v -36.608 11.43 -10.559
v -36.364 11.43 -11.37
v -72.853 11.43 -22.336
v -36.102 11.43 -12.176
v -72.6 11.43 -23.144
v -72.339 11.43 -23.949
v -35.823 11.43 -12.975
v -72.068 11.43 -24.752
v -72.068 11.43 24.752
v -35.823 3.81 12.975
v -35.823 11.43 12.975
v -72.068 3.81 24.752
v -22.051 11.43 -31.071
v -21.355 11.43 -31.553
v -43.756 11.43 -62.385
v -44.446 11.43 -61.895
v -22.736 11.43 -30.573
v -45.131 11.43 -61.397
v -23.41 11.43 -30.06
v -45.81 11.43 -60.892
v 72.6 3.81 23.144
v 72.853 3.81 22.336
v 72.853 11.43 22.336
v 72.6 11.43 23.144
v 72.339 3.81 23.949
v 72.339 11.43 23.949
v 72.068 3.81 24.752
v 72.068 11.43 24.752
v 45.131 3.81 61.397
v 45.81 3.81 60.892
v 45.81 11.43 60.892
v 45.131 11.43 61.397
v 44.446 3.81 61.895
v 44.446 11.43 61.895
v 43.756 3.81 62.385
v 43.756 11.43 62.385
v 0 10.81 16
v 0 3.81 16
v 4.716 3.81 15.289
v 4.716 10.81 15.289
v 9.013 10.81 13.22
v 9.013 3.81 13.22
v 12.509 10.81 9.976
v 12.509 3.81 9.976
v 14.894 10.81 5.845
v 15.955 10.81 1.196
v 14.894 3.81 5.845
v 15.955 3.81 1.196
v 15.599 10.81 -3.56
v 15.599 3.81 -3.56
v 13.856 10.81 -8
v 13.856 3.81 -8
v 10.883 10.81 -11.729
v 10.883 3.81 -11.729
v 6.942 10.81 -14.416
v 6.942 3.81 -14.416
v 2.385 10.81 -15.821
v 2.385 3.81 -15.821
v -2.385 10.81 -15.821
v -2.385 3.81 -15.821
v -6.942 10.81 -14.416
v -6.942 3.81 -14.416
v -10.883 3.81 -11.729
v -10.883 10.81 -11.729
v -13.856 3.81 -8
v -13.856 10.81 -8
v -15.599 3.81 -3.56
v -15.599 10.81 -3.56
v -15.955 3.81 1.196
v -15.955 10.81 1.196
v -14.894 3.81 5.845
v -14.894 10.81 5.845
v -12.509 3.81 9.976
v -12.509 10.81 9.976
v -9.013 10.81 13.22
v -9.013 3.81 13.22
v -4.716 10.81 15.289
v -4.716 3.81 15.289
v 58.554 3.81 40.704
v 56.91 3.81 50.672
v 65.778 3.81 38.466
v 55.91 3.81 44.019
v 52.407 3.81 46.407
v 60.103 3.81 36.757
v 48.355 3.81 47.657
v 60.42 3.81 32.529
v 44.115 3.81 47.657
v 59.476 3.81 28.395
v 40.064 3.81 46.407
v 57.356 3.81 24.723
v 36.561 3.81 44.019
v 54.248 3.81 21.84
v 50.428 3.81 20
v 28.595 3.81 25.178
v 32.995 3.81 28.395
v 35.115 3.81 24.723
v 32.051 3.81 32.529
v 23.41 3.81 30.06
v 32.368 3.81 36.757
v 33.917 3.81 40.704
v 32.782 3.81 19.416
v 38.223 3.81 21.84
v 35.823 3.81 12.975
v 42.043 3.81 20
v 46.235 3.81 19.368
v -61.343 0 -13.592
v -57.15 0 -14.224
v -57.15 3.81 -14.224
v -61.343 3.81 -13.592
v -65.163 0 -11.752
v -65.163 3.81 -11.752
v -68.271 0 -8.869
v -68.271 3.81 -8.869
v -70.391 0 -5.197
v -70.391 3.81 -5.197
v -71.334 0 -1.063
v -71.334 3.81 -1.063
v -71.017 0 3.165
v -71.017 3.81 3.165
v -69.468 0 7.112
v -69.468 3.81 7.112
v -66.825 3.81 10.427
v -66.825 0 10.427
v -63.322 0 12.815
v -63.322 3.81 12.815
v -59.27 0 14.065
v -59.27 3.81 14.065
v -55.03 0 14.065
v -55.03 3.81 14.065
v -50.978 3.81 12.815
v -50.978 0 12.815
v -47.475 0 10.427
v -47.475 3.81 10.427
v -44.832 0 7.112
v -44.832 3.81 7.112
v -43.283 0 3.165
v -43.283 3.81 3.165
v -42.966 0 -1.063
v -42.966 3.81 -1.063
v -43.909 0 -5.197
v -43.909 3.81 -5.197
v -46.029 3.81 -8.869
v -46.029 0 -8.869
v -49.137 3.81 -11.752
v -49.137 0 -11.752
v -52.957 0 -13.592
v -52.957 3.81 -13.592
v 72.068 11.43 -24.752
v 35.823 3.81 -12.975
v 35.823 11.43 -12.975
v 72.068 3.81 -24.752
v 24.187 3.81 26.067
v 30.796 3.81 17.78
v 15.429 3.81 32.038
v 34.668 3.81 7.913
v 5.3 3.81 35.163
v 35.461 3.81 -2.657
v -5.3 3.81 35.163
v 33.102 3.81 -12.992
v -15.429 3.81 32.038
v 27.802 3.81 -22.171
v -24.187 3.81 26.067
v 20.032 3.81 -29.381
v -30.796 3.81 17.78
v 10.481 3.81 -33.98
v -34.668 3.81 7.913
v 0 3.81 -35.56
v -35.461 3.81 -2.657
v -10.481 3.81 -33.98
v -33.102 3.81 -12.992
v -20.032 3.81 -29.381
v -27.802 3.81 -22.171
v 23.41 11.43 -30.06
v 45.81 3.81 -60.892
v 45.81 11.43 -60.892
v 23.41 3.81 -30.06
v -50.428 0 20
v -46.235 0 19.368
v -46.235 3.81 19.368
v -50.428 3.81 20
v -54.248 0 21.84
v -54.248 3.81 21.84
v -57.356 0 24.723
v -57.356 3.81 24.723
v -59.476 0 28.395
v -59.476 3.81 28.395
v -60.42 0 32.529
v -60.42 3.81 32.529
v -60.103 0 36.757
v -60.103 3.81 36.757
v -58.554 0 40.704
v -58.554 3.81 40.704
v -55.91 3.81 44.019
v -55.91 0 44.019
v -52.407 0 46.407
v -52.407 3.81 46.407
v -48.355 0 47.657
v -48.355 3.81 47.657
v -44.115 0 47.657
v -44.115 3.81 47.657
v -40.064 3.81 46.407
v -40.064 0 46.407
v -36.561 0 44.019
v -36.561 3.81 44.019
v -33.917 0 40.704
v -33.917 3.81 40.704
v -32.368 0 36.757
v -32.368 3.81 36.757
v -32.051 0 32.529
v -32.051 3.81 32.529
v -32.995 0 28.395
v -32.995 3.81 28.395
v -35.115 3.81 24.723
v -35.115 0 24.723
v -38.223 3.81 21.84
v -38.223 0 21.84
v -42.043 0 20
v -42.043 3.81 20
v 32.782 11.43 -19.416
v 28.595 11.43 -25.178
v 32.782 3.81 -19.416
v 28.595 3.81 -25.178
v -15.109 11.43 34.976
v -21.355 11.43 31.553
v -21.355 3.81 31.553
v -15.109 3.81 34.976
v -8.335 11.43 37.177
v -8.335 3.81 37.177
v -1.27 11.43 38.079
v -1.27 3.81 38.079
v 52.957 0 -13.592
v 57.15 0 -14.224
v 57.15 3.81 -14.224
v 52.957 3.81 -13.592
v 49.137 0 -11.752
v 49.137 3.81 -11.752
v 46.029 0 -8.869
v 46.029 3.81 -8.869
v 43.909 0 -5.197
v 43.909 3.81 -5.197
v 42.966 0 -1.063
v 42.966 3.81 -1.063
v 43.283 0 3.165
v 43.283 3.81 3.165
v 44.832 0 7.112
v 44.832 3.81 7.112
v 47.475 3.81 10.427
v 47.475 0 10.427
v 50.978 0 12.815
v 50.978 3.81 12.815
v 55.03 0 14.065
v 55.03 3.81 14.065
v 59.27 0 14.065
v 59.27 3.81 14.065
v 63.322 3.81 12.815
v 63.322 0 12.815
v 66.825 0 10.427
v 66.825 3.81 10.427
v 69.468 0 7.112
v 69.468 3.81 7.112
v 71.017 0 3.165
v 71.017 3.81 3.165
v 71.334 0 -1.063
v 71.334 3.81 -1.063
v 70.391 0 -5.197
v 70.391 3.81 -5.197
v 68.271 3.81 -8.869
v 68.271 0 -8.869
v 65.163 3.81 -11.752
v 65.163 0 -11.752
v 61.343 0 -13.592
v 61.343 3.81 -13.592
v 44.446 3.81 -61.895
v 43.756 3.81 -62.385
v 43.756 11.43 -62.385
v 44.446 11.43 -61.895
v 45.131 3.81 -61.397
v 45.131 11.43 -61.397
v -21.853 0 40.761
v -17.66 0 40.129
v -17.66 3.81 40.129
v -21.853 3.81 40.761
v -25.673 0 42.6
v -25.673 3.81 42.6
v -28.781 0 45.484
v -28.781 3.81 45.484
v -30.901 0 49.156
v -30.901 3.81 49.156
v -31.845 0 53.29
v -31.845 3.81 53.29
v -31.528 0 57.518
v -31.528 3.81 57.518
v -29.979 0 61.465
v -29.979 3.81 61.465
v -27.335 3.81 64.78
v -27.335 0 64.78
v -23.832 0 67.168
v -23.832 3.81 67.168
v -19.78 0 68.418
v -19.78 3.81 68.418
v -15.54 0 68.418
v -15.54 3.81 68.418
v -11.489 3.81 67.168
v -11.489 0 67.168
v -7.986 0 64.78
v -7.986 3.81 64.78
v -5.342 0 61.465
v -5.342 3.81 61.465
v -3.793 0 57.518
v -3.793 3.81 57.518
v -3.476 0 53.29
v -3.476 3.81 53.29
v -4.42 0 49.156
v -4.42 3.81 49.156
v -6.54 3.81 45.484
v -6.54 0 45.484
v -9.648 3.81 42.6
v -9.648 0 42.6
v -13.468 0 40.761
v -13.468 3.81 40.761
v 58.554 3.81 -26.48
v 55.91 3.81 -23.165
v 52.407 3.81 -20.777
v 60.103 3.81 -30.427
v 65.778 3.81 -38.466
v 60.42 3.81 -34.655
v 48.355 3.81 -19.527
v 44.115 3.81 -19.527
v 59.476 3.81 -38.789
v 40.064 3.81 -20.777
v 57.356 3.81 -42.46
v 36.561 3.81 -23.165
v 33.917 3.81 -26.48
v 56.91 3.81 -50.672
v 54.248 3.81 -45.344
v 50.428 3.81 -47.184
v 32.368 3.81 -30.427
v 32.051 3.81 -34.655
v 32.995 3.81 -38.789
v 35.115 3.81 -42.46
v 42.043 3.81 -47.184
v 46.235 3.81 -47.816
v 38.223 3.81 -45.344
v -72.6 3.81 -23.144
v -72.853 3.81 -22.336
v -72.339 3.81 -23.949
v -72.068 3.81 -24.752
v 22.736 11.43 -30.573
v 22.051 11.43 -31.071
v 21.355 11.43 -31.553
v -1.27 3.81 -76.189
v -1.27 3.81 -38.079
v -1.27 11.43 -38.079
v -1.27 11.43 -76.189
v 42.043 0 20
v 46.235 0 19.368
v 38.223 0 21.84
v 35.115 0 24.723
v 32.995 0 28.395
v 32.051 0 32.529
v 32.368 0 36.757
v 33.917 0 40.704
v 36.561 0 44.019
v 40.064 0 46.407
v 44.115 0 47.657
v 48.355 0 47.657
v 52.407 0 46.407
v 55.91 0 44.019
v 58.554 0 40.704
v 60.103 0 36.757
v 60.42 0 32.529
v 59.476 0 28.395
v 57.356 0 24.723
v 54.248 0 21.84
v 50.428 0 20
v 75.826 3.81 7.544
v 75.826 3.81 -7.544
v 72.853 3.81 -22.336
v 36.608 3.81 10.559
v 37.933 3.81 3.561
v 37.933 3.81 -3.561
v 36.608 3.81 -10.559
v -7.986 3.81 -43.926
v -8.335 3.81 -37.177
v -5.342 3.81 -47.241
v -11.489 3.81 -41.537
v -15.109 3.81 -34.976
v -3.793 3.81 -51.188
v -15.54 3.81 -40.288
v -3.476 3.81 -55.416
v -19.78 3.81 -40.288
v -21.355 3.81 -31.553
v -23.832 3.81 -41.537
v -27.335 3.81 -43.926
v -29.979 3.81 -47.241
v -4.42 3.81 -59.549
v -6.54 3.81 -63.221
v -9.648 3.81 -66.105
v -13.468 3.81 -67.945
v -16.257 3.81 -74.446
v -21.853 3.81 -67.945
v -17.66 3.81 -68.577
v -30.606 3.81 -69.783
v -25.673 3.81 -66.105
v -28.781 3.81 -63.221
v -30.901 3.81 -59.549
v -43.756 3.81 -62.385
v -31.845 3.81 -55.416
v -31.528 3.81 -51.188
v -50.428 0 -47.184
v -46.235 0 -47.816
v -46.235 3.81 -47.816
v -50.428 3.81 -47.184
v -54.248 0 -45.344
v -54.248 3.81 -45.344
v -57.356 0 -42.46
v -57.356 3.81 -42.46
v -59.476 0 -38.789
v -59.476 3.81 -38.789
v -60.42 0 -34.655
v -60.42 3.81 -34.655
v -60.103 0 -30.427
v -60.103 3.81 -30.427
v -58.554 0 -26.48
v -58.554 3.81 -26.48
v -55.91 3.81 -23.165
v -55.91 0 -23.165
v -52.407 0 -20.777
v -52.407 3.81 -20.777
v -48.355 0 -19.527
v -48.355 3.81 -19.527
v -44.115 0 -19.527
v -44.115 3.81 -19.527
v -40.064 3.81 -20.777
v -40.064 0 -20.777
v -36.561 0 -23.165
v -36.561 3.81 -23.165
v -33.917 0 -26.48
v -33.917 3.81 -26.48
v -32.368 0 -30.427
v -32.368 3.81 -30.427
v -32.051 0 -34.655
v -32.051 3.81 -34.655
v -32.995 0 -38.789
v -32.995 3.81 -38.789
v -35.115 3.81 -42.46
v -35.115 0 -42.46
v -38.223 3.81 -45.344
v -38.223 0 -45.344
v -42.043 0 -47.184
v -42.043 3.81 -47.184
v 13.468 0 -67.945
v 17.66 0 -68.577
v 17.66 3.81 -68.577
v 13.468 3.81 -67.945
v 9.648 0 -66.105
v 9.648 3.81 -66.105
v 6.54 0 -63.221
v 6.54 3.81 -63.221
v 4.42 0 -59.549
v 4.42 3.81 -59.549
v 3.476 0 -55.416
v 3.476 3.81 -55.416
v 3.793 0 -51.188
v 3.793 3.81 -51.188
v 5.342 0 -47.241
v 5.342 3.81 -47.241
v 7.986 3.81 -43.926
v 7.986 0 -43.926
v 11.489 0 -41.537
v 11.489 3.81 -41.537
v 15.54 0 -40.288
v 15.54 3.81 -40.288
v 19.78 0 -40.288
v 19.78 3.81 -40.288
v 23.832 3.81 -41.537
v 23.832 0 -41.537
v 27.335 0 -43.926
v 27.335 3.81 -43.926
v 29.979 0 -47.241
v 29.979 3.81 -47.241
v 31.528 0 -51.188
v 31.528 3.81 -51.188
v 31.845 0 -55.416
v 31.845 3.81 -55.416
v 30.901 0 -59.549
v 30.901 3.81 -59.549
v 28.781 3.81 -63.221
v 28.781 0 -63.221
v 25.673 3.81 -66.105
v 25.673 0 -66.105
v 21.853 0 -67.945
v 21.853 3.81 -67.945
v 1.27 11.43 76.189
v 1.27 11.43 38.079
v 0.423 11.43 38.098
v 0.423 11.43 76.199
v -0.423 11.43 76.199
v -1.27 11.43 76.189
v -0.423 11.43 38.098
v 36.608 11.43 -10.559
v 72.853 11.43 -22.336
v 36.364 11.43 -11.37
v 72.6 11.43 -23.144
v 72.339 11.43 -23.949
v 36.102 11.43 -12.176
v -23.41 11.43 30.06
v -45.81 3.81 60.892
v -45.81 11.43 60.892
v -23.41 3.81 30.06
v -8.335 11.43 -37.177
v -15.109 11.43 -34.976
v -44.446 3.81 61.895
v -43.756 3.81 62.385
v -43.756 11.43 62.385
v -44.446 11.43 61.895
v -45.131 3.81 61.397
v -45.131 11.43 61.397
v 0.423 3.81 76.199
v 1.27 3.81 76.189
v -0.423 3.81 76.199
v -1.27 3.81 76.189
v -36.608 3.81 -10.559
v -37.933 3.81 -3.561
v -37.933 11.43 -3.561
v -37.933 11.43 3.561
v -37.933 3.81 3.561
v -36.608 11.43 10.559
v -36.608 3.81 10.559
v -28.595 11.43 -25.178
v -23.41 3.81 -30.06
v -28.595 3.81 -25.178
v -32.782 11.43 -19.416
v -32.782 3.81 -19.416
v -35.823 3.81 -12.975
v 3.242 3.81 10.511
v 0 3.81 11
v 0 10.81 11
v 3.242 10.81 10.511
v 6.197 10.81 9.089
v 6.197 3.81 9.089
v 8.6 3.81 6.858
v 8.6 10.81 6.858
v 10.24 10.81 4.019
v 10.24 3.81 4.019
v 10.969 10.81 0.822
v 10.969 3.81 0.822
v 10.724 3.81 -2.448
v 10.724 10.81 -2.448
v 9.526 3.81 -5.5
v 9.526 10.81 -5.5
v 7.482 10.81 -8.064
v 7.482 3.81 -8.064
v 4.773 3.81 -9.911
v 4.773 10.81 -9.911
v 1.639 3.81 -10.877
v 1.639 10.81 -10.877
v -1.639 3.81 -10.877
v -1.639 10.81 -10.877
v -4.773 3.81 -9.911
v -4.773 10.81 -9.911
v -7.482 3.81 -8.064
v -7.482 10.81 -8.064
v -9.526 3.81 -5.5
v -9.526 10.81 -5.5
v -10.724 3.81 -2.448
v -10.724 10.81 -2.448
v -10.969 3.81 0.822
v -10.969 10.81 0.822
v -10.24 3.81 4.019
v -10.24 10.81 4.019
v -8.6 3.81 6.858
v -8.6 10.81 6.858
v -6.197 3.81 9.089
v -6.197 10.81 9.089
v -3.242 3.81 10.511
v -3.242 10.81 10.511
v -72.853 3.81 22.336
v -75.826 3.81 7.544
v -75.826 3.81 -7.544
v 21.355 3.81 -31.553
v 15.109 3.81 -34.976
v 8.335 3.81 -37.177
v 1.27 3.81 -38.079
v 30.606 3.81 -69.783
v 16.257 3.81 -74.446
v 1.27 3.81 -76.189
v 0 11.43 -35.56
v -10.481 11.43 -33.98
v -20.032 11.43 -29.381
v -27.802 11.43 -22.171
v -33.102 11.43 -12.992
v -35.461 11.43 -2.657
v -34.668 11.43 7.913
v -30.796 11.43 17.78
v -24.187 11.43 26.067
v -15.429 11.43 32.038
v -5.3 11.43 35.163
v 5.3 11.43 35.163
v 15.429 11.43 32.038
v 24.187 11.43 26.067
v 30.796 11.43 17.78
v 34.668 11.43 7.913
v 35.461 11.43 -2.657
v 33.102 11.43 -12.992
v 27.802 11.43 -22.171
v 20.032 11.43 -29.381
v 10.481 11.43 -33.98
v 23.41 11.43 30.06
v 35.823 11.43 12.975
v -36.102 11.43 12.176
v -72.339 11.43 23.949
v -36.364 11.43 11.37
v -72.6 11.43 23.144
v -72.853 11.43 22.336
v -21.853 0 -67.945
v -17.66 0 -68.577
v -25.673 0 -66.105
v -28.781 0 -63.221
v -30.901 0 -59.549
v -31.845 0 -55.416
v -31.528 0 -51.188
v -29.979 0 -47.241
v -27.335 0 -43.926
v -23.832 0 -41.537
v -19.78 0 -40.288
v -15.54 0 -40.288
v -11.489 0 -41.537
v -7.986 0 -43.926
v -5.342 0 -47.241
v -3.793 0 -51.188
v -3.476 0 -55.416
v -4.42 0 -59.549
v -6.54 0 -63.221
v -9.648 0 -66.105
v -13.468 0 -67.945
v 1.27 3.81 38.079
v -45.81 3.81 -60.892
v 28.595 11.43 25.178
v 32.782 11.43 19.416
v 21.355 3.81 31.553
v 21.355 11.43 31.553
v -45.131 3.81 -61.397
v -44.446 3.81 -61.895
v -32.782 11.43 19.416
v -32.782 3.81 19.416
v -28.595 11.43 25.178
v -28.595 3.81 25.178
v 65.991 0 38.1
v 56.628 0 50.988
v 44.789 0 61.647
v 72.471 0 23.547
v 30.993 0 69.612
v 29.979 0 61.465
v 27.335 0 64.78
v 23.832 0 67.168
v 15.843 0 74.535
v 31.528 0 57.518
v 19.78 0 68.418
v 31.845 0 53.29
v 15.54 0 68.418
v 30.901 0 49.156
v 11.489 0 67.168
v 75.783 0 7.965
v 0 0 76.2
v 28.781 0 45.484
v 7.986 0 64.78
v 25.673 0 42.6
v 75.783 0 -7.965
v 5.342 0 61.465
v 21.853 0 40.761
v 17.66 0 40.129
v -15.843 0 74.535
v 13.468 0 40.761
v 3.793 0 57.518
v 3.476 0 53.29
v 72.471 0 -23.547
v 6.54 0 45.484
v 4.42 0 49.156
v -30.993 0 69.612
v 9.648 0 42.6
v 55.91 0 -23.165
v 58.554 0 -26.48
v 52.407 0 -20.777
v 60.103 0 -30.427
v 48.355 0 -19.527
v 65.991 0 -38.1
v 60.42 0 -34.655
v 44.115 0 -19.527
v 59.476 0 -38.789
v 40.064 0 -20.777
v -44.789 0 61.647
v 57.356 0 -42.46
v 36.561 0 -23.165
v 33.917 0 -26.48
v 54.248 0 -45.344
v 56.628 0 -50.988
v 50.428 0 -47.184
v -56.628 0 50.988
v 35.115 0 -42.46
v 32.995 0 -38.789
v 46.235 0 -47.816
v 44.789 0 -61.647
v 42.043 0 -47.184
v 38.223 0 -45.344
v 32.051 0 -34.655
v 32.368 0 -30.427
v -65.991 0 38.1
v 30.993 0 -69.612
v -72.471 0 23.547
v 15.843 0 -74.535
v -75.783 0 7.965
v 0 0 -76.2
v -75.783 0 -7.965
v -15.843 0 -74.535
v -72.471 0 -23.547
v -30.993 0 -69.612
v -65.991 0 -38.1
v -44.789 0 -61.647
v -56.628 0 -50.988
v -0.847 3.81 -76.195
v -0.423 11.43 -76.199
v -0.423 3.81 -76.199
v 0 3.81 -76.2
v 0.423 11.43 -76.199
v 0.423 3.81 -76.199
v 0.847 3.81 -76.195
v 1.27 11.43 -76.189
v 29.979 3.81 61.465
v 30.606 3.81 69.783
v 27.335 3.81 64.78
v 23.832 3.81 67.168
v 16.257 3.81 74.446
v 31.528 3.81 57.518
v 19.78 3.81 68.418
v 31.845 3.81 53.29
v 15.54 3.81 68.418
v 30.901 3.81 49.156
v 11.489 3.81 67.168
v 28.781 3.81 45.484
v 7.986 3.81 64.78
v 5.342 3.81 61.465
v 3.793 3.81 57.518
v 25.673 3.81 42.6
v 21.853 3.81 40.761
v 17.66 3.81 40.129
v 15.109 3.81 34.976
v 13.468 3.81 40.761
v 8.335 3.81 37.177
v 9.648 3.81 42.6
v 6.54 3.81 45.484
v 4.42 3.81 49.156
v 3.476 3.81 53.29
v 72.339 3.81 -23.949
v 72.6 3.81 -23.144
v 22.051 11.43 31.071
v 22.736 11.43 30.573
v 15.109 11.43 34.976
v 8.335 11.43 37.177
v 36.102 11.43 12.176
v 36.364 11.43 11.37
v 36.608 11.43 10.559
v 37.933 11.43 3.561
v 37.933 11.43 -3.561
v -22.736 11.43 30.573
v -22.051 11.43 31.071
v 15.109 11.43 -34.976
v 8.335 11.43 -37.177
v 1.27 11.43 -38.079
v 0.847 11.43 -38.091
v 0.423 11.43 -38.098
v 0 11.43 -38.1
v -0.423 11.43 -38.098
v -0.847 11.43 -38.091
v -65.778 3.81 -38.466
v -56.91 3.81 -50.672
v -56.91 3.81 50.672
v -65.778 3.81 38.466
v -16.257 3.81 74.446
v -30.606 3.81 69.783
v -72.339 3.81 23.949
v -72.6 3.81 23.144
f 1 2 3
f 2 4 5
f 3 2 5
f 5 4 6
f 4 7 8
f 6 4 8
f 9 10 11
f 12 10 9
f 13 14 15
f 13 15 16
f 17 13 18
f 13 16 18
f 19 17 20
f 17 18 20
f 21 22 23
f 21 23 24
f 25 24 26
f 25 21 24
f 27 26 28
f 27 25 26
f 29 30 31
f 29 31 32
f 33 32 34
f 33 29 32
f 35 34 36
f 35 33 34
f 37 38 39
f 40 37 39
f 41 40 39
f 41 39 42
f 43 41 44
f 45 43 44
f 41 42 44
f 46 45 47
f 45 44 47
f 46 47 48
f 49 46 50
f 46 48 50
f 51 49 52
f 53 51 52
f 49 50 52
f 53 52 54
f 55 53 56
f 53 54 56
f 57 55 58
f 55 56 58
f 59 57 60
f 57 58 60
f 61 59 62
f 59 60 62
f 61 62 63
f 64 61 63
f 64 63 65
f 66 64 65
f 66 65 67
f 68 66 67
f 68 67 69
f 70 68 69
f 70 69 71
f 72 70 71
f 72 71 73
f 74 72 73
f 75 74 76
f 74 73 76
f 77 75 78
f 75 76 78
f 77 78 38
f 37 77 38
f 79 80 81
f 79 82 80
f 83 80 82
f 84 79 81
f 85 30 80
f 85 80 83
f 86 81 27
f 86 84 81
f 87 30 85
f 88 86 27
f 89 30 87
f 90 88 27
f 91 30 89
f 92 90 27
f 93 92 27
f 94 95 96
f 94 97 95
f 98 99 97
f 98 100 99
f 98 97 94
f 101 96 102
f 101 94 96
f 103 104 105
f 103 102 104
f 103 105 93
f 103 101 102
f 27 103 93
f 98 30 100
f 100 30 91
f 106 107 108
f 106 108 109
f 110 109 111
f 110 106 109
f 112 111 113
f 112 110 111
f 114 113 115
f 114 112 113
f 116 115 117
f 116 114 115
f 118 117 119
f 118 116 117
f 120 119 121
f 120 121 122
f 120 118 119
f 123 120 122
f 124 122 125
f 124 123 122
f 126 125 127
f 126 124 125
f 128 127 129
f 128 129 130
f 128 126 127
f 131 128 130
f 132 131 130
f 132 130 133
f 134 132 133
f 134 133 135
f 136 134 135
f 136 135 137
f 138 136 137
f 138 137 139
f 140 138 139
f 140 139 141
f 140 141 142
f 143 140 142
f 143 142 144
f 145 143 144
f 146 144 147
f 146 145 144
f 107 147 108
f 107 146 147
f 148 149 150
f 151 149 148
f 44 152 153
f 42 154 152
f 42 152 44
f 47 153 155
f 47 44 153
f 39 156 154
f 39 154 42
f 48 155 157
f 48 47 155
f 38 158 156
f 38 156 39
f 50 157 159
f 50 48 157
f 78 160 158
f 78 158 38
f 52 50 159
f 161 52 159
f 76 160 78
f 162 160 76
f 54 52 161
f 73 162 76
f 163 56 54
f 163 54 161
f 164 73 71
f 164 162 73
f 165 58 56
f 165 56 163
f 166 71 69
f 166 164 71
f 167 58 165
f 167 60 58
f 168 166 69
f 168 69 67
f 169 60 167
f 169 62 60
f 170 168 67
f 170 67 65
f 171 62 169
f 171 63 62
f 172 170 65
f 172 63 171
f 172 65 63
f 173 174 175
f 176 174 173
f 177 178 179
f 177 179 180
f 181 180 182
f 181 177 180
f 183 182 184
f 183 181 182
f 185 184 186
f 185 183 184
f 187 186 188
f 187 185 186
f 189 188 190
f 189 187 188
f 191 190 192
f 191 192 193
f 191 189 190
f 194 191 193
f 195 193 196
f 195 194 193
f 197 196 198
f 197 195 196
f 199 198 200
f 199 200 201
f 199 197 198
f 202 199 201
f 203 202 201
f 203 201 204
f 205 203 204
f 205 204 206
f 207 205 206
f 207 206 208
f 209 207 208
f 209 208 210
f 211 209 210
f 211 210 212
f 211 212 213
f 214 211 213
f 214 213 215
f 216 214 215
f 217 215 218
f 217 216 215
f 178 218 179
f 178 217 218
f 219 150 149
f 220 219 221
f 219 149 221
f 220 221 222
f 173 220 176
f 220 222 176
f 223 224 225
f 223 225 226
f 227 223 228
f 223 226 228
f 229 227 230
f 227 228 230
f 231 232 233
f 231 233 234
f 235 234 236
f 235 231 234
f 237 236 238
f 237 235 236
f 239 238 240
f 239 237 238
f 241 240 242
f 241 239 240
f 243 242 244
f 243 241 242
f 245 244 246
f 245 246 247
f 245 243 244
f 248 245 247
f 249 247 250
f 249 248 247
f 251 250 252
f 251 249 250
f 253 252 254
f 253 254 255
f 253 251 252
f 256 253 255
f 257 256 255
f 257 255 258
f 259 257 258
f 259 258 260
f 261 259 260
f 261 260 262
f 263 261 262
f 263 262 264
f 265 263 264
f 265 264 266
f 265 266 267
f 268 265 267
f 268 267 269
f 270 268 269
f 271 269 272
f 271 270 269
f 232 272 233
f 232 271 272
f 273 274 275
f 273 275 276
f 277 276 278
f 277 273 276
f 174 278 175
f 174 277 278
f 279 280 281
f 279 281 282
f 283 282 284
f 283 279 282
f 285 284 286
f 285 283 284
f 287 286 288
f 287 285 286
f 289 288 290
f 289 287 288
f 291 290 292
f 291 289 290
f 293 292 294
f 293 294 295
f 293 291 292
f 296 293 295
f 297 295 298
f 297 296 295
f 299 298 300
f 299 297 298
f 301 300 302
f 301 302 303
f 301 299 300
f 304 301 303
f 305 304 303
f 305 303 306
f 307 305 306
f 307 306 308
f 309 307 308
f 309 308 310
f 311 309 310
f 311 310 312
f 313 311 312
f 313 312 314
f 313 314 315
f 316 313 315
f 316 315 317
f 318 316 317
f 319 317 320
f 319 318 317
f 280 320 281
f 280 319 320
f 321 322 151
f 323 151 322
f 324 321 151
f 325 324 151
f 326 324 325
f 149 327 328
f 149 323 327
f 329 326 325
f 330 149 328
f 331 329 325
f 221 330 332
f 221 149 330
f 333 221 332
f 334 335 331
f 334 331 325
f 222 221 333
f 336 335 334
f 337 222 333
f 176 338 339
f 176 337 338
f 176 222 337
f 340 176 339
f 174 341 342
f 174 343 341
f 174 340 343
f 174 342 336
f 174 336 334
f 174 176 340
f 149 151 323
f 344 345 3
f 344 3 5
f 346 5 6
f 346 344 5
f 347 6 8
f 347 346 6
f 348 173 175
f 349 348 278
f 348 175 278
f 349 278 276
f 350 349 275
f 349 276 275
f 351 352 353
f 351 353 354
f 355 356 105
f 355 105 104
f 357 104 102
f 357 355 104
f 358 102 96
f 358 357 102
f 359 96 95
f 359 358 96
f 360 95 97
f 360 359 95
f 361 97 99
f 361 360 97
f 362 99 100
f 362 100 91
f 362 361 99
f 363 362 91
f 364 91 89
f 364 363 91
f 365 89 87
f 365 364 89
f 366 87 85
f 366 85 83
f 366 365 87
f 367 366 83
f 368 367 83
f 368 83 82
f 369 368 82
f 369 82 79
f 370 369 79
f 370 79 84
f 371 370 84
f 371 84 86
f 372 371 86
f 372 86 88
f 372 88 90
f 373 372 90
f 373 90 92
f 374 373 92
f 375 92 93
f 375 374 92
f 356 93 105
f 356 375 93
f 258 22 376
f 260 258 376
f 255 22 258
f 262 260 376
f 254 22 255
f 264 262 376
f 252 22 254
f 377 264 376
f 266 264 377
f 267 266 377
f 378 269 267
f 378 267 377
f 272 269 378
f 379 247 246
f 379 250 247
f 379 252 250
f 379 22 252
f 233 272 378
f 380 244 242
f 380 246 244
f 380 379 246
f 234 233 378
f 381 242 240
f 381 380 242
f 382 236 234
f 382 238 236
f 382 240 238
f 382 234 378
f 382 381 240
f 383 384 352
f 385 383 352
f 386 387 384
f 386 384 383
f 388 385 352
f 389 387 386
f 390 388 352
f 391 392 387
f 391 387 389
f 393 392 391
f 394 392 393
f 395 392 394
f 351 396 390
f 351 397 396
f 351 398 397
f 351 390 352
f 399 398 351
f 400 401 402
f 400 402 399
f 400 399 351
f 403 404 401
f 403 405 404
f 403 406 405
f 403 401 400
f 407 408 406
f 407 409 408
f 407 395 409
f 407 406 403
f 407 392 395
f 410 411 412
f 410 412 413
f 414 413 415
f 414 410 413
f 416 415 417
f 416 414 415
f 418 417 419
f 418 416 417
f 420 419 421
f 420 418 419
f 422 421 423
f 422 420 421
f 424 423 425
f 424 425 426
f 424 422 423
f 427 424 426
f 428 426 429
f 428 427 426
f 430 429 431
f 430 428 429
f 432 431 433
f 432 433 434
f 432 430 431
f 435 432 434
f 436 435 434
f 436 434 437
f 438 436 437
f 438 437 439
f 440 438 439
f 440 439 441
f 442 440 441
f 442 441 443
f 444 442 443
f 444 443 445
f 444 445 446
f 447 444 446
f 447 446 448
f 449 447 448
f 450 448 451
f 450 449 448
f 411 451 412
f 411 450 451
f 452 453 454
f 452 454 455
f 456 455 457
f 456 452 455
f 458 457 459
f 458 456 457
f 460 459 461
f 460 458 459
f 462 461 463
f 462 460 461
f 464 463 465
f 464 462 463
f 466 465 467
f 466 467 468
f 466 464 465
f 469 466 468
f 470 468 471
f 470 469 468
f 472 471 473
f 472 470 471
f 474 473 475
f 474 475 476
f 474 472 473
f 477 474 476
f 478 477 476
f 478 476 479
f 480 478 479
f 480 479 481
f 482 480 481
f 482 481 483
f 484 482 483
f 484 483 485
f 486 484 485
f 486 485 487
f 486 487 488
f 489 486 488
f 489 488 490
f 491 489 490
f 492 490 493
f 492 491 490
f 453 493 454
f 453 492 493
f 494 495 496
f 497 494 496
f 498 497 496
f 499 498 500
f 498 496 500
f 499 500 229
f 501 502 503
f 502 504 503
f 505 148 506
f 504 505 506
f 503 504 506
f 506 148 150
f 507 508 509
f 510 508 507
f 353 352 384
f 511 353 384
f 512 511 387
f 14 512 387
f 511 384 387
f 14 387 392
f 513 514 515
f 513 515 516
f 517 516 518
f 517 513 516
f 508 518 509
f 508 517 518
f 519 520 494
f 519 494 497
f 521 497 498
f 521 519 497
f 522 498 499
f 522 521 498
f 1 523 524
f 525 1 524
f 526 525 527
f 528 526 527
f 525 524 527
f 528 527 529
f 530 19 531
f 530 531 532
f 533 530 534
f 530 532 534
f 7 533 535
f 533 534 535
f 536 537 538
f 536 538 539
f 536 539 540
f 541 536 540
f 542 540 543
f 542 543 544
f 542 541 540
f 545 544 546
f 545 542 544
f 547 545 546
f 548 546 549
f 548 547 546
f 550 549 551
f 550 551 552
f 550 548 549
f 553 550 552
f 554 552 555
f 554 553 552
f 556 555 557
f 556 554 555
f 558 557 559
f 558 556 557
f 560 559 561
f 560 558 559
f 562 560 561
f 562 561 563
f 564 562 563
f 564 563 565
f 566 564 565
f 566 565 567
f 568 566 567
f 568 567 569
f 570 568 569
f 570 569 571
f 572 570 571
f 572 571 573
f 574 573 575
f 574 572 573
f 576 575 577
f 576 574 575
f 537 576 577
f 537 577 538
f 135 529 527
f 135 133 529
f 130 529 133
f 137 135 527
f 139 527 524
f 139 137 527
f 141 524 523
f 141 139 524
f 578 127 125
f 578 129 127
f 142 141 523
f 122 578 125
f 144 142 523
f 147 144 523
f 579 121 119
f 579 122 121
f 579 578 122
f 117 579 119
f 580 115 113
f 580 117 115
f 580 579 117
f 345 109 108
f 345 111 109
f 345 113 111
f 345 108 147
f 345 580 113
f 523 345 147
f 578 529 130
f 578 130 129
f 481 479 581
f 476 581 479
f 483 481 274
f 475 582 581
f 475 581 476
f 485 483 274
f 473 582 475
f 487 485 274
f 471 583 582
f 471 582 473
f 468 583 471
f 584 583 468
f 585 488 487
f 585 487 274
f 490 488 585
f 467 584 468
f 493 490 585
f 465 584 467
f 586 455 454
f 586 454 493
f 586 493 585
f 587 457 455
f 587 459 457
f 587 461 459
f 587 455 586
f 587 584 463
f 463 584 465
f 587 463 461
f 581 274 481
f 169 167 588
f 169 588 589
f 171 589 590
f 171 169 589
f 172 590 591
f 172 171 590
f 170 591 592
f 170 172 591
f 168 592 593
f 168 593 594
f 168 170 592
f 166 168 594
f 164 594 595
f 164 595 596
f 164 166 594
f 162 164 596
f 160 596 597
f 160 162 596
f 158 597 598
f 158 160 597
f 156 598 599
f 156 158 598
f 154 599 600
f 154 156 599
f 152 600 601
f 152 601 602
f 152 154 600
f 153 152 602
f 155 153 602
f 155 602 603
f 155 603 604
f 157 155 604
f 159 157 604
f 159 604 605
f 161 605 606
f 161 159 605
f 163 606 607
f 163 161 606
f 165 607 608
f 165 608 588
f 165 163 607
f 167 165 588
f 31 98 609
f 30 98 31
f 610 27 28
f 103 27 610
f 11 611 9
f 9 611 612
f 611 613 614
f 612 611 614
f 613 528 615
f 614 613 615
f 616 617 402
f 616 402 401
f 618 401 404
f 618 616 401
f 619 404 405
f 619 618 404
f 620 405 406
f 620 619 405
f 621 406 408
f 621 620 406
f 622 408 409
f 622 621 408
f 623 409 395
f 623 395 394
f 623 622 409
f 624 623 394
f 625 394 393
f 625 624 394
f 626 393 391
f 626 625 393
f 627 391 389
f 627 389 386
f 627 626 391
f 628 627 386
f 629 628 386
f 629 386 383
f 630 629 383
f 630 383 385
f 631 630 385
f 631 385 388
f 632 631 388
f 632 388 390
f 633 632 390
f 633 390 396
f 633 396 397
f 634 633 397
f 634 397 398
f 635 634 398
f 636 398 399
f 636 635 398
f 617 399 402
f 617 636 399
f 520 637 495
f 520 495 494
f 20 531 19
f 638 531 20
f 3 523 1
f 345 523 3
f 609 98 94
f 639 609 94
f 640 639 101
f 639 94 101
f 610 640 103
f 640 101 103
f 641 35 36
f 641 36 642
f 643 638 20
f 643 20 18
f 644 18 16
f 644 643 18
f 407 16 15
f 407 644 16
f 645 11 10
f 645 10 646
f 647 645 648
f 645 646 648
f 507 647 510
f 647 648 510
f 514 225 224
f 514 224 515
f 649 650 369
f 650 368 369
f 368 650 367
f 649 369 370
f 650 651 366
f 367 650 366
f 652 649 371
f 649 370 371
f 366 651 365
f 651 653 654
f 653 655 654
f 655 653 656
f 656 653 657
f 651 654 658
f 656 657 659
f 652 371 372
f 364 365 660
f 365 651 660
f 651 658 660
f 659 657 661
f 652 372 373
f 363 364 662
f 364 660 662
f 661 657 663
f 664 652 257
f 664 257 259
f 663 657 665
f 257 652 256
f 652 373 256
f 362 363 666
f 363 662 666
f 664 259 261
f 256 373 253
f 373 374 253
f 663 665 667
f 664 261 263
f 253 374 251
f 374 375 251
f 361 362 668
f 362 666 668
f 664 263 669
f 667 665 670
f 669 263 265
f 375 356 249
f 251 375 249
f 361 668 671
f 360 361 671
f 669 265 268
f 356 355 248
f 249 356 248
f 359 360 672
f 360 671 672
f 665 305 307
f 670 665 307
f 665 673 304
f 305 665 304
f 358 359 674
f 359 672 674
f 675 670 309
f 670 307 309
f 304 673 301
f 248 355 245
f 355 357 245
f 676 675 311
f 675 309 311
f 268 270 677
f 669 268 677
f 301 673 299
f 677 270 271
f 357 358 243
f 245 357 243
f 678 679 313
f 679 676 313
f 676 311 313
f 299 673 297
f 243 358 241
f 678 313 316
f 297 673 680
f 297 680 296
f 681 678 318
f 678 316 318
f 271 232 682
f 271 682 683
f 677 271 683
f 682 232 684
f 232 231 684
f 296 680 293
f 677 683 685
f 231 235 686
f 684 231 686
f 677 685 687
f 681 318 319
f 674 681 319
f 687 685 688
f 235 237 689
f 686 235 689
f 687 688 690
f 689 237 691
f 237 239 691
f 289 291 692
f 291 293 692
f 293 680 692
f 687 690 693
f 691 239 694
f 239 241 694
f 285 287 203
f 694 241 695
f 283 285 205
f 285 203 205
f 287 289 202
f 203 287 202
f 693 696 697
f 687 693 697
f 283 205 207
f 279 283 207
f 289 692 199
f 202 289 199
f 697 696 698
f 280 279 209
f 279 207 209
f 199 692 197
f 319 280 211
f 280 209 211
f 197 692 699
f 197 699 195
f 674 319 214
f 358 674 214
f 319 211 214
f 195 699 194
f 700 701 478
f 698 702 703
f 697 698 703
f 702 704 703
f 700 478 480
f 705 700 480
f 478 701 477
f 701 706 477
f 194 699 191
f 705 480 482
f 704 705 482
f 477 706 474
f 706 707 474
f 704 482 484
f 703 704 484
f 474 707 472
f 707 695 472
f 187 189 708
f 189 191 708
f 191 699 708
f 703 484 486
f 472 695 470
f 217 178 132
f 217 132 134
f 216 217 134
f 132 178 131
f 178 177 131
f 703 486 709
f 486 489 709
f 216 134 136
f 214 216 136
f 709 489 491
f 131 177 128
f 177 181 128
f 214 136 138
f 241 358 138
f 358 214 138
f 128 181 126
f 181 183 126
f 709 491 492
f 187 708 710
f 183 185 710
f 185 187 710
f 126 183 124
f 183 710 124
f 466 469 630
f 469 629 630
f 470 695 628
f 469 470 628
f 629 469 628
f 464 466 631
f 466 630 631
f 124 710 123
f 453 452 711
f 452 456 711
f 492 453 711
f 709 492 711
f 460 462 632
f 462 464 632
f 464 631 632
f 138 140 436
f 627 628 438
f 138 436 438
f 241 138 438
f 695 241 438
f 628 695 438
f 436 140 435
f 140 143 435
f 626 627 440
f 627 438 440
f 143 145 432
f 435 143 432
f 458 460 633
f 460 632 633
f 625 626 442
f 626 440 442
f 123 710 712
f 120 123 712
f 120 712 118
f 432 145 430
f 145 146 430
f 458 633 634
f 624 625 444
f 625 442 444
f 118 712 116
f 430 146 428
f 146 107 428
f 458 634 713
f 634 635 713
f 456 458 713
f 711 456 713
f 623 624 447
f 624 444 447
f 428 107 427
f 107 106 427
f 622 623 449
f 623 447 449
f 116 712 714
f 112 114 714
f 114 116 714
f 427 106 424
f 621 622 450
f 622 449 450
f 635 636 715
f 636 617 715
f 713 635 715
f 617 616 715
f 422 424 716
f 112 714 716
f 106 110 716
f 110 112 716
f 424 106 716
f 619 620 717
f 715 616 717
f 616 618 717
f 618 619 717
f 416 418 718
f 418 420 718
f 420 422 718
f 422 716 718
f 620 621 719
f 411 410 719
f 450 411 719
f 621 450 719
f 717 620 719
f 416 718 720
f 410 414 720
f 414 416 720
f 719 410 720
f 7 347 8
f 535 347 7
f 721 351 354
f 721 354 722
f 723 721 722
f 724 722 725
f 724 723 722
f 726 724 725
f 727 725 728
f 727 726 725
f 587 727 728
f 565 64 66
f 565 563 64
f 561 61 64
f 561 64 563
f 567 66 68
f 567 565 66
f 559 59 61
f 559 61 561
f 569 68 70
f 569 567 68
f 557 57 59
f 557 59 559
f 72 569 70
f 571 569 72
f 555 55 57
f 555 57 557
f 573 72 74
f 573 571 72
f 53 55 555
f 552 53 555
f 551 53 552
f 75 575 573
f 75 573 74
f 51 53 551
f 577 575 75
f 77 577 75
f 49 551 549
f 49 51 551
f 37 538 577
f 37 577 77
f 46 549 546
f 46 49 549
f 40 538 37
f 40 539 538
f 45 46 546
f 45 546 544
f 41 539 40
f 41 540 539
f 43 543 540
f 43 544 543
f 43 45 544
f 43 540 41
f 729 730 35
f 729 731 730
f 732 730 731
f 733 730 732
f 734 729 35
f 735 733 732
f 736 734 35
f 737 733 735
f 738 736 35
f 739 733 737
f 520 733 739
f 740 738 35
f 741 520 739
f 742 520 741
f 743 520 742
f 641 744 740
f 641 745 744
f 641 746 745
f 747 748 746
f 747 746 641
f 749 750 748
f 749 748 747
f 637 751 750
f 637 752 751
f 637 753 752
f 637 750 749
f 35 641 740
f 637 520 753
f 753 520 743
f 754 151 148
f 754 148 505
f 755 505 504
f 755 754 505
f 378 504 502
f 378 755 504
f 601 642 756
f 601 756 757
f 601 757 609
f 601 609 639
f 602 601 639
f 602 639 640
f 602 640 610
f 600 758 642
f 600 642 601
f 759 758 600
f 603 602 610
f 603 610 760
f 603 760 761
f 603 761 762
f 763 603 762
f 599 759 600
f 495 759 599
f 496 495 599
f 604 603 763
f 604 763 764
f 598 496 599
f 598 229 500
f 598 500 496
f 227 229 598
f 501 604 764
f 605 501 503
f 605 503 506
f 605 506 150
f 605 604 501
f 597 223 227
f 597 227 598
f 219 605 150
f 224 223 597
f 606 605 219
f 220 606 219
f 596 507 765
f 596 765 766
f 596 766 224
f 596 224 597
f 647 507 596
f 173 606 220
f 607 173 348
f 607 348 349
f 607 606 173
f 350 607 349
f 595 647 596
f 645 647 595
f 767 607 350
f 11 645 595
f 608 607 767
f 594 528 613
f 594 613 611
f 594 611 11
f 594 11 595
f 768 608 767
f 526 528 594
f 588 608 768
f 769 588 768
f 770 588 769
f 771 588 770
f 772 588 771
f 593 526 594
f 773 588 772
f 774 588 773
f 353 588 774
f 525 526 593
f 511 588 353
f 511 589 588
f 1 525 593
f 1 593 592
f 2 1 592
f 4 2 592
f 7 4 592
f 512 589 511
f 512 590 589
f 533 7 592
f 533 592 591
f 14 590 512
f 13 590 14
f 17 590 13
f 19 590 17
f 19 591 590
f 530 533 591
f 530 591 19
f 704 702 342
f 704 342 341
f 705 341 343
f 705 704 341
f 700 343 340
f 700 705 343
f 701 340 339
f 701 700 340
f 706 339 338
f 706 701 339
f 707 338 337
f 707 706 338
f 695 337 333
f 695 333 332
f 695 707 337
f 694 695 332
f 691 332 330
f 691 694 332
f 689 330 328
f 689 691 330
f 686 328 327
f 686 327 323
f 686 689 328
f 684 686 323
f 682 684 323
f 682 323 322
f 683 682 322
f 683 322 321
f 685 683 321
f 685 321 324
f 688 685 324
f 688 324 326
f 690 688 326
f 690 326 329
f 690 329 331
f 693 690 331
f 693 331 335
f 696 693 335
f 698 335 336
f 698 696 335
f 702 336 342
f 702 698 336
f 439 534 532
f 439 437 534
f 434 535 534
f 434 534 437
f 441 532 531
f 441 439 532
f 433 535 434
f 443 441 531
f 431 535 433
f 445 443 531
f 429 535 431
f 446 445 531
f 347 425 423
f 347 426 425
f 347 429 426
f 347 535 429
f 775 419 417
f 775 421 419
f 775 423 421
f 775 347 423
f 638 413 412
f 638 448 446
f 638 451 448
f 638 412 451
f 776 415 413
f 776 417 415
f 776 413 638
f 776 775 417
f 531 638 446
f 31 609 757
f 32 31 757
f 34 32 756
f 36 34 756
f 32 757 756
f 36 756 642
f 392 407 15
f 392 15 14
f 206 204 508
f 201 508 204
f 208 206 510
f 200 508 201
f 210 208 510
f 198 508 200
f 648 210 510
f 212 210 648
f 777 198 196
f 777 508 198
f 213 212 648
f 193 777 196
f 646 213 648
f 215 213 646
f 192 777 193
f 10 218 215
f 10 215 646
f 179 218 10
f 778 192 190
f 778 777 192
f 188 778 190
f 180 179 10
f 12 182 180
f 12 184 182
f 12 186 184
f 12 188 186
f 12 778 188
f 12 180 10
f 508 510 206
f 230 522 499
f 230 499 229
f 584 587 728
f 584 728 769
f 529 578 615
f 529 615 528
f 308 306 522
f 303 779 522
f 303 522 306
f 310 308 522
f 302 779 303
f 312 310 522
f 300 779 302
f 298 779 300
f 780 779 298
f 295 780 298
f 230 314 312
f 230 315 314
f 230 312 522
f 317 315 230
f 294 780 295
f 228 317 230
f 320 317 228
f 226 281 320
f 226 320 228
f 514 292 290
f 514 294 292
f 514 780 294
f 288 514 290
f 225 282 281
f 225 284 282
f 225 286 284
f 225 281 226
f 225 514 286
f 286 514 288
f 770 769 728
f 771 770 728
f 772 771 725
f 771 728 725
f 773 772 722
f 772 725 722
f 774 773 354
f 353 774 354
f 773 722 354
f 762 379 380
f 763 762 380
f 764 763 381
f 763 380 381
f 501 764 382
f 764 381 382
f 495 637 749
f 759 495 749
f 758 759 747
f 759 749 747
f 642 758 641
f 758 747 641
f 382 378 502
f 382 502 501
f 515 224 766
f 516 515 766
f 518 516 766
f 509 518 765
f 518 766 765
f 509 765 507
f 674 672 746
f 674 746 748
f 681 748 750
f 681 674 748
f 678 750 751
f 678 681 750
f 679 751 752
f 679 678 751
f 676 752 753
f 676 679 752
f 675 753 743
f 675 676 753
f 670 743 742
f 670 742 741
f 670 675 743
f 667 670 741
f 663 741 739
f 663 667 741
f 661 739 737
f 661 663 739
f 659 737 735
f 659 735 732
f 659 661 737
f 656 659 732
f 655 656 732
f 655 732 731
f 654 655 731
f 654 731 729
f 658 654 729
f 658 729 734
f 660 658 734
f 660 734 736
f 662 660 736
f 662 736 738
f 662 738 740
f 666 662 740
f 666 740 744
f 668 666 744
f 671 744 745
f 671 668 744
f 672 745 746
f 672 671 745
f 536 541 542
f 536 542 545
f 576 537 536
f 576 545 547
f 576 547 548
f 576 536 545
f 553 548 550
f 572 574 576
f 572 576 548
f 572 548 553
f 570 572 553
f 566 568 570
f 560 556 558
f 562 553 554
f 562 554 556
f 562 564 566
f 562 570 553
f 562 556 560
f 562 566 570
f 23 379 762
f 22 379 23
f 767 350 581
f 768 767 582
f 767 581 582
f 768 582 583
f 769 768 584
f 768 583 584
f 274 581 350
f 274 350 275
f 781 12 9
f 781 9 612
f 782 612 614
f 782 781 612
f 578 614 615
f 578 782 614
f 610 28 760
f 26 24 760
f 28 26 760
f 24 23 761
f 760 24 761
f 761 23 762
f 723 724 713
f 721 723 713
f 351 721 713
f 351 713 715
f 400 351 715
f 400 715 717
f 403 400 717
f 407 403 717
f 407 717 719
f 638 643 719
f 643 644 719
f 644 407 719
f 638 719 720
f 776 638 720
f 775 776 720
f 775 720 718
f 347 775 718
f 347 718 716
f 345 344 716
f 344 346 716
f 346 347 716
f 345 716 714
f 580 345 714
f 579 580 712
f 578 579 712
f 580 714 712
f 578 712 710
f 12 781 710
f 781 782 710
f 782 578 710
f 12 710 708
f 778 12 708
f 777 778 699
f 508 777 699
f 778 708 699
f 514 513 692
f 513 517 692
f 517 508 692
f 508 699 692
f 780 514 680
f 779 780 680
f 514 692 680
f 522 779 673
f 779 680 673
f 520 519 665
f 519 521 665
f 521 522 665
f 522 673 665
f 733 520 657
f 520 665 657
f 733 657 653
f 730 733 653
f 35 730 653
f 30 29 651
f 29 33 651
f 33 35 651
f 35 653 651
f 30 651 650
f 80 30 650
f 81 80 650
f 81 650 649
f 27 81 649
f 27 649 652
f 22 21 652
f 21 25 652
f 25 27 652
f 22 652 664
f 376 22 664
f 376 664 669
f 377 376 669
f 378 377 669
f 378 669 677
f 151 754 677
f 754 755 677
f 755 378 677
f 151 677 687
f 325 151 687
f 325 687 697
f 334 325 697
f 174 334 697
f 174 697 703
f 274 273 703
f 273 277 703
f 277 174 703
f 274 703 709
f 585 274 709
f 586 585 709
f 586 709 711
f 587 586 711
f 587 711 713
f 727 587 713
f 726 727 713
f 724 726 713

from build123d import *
from build123d.topology import SkipClean

# Parameters (mm, degrees)
SKETCH1_R           = 76.2
SKETCH1_R_2         = 14.224
BOSS_EXTRUDE1_DEPTH = 3.81
SKETCH3_R           = 38.1
SKETCH3_R_2         = 35.56
BOSS_EXTRUDE3_DEPTH = 7.62
BOSS_EXTRUDE4_DEPTH = 7.62
SKETCH4_R           = 16
SKETCH4_R_2         = 11
BOSS_EXTRUDE5_DEPTH = 7


with BuildPart() as part:
    # Sketch1 → Boss-Extrude1 (new body)
    with BuildSketch(Plane(origin=(0, 0, 0), x_dir=(1, 0, 0), z_dir=(0, 1, 0))):
        with Locations(Location((0, 0, 0), (0, 0, 90))):
            Circle(SKETCH1_R)
        with Locations(Location((-57.15, 0, 0), (0, 0, 90))):
            Circle(SKETCH1_R_2, mode=Mode.SUBTRACT)
        with Locations(Location((-46.235321229, 33.591927169, 0), (0, 0, 90))):
            Circle(SKETCH1_R_2, mode=Mode.SUBTRACT)
        with Locations(Location((-17.660321229, 54.352879906, 0), (0, 0, 90))):
            Circle(SKETCH1_R_2, mode=Mode.SUBTRACT)
        with Locations(Location((17.660321229, 54.352879906, 0), (0, 0, 90))):
            Circle(SKETCH1_R_2, mode=Mode.SUBTRACT)
        with Locations(Location((46.235321229, 33.591927169, 0), (0, 0, 90))):
            Circle(SKETCH1_R_2, mode=Mode.SUBTRACT)
        with Locations(Location((57.15, 0, 0), (0, 0, 90))):
            Circle(SKETCH1_R_2, mode=Mode.SUBTRACT)
        with Locations(Location((46.235321229, -33.591927169, 0), (0, 0, 90))):
            Circle(SKETCH1_R_2, mode=Mode.SUBTRACT)
        with Locations(Location((17.660321229, -54.352879906, 0), (0, 0, 90))):
            Circle(SKETCH1_R_2, mode=Mode.SUBTRACT)
        with Locations(Location((-17.660321229, -54.352879906, 0), (0, 0, 90))):
            Circle(SKETCH1_R_2, mode=Mode.SUBTRACT)
        with Locations(Location((-46.235321229, -33.591927169, 0), (0, 0, 90))):
            Circle(SKETCH1_R_2, mode=Mode.SUBTRACT)
    extrude(amount=BOSS_EXTRUDE1_DEPTH)

    # Sketch3 → Boss-Extrude3 (add)
    with BuildSketch(Plane(origin=(0, 3.81, 0), x_dir=(1, 0, 0), z_dir=(0, 1, 0))):
        with Locations(Location((0, 0, 0), (0, 0, 90))):
            Circle(SKETCH3_R)
        with Locations(Location((0, 0, 0), (0, 0, 90))):
            Circle(SKETCH3_R_2, mode=Mode.SUBTRACT)
    extrude(amount=BOSS_EXTRUDE3_DEPTH)

    # Sketch2 → Boss-Extrude4 (add)
    with SkipClean():  # the faces are left unmerged after this step: merging them gives an invalid solid
        with BuildSketch(Plane(origin=(0, 3.81, 0), x_dir=(1, 0, 0), z_dir=(0, 1, 0))):
            with BuildLine():
                Line((-72.852892077, -22.335982539), (-36.607568562, -10.559163032))
                ThreePointArc((-36.607568562, -10.559163032), (-36.235253271, -11.773547486), (-35.822665397, -12.974846584))
                Line((-35.822665397, -12.974846584), (-72.067988912, -24.75166609))
                ThreePointArc((-72.067988912, -24.75166609), (-72.470506542, -23.547094971), (-72.852892077, -22.335982539))
            make_face()
            with BuildLine():
                Line((-72.067988912, 24.75166609), (-35.822665397, 12.974846584))
                ThreePointArc((-35.822665397, 12.974846584), (-36.235253271, 11.773547486), (-36.607568562, 10.559163032))
                Line((-36.607568562, 10.559163032), (-72.852892077, 22.335982539))
                ThreePointArc((-72.852892077, 22.335982539), (-72.470506542, 23.547094971), (-72.067988912, 24.75166609))
            make_face()
            with BuildLine():
                Line((-43.755563483, 62.385019551), (-21.354721617, 31.552905804))
                ThreePointArc((-21.354721617, 31.552905804), (-22.394618112, 30.823547486), (-23.409624783, 30.059931263))
                Line((-23.409624783, 30.059931263), (-45.810466648, 60.89204501))
                ThreePointArc((-45.810466648, 60.89204501), (-44.789236225, 61.647094971), (-43.755563483, 62.385019551))
            make_face()
            with BuildLine():
                Line((1.27, 76.189415932), (1.27, 38.07882745))
                ThreePointArc((1.27, 38.07882745), (0, 38.1), (-1.27, 38.07882745))
                Line((-1.27, 38.07882745), (-1.27, 76.189415932))
                ThreePointArc((-1.27, 76.189415932), (0, 76.2), (1.27, 76.189415932))
            make_face()
            with BuildLine():
                Line((45.810466648, 60.89204501), (23.409624783, 30.059931263))
                ThreePointArc((23.409624783, 30.059931263), (22.394618112, 30.823547486), (21.354721617, 31.552905804))
                Line((21.354721617, 31.552905804), (43.755563483, 62.385019551))
                ThreePointArc((43.755563483, 62.385019551), (44.789236225, 61.647094971), (45.810466648, 60.89204501))
            make_face()
            with BuildLine():
                Line((72.852892077, 22.335982539), (36.607568562, 10.559163032))
                ThreePointArc((36.607568562, 10.559163032), (36.235253271, 11.773547486), (35.822665397, 12.974846584))
                Line((35.822665397, 12.974846584), (72.067988912, 24.75166609))
                ThreePointArc((72.067988912, 24.75166609), (72.470506542, 23.547094971), (72.852892077, 22.335982539))
            make_face()
            with BuildLine():
                Line((72.067988912, -24.75166609), (35.822665397, -12.974846584))
                ThreePointArc((35.822665397, -12.974846584), (36.235253271, -11.773547486), (36.607568562, -10.559163032))
                Line((36.607568562, -10.559163032), (72.852892077, -22.335982539))
                ThreePointArc((72.852892077, -22.335982539), (72.470506542, -23.547094971), (72.067988912, -24.75166609))
            make_face()
            with BuildLine():
                Line((43.755563483, -62.385019551), (21.354721617, -31.552905804))
                ThreePointArc((21.354721617, -31.552905804), (22.394618112, -30.823547486), (23.409624783, -30.059931263))
                Line((23.409624783, -30.059931263), (45.810466648, -60.89204501))
                ThreePointArc((45.810466648, -60.89204501), (44.789236225, -61.647094971), (43.755563483, -62.385019551))
            make_face()
            with BuildLine():
                Line((-1.27, -76.189415932), (-1.27, -38.07882745))
                ThreePointArc((-1.27, -38.07882745), (0, -38.1), (1.27, -38.07882745))
                Line((1.27, -38.07882745), (1.27, -76.189415932))
                ThreePointArc((1.27, -76.189415932), (0, -76.2), (-1.27, -76.189415932))
            make_face()
            with BuildLine():
                Line((-45.810466648, -60.89204501), (-23.409624783, -30.059931263))
                ThreePointArc((-23.409624783, -30.059931263), (-22.394618112, -30.823547486), (-21.354721617, -31.552905804))
                Line((-21.354721617, -31.552905804), (-43.755563483, -62.385019551))
                ThreePointArc((-43.755563483, -62.385019551), (-44.789236225, -61.647094971), (-45.810466648, -60.89204501))
            make_face()
        extrude(amount=BOSS_EXTRUDE4_DEPTH)

    # Sketch4 → Boss-Extrude5 (add)
    with SkipClean():  # the faces are left unmerged after this step: merging them gives an invalid solid
        with BuildSketch(Plane(origin=(0, 3.81, 0), x_dir=(1, 0, 0), z_dir=(0, 1, 0))):
            with Locations(Location((0, 0, 0), (0, 0, 270))):
                Circle(SKETCH4_R)
            with Locations(Location((0, 0, 0), (0, 0, 270))):
                Circle(SKETCH4_R_2, mode=Mode.SUBTRACT)
        extrude(amount=BOSS_EXTRUDE5_DEPTH)


solid = part.part
